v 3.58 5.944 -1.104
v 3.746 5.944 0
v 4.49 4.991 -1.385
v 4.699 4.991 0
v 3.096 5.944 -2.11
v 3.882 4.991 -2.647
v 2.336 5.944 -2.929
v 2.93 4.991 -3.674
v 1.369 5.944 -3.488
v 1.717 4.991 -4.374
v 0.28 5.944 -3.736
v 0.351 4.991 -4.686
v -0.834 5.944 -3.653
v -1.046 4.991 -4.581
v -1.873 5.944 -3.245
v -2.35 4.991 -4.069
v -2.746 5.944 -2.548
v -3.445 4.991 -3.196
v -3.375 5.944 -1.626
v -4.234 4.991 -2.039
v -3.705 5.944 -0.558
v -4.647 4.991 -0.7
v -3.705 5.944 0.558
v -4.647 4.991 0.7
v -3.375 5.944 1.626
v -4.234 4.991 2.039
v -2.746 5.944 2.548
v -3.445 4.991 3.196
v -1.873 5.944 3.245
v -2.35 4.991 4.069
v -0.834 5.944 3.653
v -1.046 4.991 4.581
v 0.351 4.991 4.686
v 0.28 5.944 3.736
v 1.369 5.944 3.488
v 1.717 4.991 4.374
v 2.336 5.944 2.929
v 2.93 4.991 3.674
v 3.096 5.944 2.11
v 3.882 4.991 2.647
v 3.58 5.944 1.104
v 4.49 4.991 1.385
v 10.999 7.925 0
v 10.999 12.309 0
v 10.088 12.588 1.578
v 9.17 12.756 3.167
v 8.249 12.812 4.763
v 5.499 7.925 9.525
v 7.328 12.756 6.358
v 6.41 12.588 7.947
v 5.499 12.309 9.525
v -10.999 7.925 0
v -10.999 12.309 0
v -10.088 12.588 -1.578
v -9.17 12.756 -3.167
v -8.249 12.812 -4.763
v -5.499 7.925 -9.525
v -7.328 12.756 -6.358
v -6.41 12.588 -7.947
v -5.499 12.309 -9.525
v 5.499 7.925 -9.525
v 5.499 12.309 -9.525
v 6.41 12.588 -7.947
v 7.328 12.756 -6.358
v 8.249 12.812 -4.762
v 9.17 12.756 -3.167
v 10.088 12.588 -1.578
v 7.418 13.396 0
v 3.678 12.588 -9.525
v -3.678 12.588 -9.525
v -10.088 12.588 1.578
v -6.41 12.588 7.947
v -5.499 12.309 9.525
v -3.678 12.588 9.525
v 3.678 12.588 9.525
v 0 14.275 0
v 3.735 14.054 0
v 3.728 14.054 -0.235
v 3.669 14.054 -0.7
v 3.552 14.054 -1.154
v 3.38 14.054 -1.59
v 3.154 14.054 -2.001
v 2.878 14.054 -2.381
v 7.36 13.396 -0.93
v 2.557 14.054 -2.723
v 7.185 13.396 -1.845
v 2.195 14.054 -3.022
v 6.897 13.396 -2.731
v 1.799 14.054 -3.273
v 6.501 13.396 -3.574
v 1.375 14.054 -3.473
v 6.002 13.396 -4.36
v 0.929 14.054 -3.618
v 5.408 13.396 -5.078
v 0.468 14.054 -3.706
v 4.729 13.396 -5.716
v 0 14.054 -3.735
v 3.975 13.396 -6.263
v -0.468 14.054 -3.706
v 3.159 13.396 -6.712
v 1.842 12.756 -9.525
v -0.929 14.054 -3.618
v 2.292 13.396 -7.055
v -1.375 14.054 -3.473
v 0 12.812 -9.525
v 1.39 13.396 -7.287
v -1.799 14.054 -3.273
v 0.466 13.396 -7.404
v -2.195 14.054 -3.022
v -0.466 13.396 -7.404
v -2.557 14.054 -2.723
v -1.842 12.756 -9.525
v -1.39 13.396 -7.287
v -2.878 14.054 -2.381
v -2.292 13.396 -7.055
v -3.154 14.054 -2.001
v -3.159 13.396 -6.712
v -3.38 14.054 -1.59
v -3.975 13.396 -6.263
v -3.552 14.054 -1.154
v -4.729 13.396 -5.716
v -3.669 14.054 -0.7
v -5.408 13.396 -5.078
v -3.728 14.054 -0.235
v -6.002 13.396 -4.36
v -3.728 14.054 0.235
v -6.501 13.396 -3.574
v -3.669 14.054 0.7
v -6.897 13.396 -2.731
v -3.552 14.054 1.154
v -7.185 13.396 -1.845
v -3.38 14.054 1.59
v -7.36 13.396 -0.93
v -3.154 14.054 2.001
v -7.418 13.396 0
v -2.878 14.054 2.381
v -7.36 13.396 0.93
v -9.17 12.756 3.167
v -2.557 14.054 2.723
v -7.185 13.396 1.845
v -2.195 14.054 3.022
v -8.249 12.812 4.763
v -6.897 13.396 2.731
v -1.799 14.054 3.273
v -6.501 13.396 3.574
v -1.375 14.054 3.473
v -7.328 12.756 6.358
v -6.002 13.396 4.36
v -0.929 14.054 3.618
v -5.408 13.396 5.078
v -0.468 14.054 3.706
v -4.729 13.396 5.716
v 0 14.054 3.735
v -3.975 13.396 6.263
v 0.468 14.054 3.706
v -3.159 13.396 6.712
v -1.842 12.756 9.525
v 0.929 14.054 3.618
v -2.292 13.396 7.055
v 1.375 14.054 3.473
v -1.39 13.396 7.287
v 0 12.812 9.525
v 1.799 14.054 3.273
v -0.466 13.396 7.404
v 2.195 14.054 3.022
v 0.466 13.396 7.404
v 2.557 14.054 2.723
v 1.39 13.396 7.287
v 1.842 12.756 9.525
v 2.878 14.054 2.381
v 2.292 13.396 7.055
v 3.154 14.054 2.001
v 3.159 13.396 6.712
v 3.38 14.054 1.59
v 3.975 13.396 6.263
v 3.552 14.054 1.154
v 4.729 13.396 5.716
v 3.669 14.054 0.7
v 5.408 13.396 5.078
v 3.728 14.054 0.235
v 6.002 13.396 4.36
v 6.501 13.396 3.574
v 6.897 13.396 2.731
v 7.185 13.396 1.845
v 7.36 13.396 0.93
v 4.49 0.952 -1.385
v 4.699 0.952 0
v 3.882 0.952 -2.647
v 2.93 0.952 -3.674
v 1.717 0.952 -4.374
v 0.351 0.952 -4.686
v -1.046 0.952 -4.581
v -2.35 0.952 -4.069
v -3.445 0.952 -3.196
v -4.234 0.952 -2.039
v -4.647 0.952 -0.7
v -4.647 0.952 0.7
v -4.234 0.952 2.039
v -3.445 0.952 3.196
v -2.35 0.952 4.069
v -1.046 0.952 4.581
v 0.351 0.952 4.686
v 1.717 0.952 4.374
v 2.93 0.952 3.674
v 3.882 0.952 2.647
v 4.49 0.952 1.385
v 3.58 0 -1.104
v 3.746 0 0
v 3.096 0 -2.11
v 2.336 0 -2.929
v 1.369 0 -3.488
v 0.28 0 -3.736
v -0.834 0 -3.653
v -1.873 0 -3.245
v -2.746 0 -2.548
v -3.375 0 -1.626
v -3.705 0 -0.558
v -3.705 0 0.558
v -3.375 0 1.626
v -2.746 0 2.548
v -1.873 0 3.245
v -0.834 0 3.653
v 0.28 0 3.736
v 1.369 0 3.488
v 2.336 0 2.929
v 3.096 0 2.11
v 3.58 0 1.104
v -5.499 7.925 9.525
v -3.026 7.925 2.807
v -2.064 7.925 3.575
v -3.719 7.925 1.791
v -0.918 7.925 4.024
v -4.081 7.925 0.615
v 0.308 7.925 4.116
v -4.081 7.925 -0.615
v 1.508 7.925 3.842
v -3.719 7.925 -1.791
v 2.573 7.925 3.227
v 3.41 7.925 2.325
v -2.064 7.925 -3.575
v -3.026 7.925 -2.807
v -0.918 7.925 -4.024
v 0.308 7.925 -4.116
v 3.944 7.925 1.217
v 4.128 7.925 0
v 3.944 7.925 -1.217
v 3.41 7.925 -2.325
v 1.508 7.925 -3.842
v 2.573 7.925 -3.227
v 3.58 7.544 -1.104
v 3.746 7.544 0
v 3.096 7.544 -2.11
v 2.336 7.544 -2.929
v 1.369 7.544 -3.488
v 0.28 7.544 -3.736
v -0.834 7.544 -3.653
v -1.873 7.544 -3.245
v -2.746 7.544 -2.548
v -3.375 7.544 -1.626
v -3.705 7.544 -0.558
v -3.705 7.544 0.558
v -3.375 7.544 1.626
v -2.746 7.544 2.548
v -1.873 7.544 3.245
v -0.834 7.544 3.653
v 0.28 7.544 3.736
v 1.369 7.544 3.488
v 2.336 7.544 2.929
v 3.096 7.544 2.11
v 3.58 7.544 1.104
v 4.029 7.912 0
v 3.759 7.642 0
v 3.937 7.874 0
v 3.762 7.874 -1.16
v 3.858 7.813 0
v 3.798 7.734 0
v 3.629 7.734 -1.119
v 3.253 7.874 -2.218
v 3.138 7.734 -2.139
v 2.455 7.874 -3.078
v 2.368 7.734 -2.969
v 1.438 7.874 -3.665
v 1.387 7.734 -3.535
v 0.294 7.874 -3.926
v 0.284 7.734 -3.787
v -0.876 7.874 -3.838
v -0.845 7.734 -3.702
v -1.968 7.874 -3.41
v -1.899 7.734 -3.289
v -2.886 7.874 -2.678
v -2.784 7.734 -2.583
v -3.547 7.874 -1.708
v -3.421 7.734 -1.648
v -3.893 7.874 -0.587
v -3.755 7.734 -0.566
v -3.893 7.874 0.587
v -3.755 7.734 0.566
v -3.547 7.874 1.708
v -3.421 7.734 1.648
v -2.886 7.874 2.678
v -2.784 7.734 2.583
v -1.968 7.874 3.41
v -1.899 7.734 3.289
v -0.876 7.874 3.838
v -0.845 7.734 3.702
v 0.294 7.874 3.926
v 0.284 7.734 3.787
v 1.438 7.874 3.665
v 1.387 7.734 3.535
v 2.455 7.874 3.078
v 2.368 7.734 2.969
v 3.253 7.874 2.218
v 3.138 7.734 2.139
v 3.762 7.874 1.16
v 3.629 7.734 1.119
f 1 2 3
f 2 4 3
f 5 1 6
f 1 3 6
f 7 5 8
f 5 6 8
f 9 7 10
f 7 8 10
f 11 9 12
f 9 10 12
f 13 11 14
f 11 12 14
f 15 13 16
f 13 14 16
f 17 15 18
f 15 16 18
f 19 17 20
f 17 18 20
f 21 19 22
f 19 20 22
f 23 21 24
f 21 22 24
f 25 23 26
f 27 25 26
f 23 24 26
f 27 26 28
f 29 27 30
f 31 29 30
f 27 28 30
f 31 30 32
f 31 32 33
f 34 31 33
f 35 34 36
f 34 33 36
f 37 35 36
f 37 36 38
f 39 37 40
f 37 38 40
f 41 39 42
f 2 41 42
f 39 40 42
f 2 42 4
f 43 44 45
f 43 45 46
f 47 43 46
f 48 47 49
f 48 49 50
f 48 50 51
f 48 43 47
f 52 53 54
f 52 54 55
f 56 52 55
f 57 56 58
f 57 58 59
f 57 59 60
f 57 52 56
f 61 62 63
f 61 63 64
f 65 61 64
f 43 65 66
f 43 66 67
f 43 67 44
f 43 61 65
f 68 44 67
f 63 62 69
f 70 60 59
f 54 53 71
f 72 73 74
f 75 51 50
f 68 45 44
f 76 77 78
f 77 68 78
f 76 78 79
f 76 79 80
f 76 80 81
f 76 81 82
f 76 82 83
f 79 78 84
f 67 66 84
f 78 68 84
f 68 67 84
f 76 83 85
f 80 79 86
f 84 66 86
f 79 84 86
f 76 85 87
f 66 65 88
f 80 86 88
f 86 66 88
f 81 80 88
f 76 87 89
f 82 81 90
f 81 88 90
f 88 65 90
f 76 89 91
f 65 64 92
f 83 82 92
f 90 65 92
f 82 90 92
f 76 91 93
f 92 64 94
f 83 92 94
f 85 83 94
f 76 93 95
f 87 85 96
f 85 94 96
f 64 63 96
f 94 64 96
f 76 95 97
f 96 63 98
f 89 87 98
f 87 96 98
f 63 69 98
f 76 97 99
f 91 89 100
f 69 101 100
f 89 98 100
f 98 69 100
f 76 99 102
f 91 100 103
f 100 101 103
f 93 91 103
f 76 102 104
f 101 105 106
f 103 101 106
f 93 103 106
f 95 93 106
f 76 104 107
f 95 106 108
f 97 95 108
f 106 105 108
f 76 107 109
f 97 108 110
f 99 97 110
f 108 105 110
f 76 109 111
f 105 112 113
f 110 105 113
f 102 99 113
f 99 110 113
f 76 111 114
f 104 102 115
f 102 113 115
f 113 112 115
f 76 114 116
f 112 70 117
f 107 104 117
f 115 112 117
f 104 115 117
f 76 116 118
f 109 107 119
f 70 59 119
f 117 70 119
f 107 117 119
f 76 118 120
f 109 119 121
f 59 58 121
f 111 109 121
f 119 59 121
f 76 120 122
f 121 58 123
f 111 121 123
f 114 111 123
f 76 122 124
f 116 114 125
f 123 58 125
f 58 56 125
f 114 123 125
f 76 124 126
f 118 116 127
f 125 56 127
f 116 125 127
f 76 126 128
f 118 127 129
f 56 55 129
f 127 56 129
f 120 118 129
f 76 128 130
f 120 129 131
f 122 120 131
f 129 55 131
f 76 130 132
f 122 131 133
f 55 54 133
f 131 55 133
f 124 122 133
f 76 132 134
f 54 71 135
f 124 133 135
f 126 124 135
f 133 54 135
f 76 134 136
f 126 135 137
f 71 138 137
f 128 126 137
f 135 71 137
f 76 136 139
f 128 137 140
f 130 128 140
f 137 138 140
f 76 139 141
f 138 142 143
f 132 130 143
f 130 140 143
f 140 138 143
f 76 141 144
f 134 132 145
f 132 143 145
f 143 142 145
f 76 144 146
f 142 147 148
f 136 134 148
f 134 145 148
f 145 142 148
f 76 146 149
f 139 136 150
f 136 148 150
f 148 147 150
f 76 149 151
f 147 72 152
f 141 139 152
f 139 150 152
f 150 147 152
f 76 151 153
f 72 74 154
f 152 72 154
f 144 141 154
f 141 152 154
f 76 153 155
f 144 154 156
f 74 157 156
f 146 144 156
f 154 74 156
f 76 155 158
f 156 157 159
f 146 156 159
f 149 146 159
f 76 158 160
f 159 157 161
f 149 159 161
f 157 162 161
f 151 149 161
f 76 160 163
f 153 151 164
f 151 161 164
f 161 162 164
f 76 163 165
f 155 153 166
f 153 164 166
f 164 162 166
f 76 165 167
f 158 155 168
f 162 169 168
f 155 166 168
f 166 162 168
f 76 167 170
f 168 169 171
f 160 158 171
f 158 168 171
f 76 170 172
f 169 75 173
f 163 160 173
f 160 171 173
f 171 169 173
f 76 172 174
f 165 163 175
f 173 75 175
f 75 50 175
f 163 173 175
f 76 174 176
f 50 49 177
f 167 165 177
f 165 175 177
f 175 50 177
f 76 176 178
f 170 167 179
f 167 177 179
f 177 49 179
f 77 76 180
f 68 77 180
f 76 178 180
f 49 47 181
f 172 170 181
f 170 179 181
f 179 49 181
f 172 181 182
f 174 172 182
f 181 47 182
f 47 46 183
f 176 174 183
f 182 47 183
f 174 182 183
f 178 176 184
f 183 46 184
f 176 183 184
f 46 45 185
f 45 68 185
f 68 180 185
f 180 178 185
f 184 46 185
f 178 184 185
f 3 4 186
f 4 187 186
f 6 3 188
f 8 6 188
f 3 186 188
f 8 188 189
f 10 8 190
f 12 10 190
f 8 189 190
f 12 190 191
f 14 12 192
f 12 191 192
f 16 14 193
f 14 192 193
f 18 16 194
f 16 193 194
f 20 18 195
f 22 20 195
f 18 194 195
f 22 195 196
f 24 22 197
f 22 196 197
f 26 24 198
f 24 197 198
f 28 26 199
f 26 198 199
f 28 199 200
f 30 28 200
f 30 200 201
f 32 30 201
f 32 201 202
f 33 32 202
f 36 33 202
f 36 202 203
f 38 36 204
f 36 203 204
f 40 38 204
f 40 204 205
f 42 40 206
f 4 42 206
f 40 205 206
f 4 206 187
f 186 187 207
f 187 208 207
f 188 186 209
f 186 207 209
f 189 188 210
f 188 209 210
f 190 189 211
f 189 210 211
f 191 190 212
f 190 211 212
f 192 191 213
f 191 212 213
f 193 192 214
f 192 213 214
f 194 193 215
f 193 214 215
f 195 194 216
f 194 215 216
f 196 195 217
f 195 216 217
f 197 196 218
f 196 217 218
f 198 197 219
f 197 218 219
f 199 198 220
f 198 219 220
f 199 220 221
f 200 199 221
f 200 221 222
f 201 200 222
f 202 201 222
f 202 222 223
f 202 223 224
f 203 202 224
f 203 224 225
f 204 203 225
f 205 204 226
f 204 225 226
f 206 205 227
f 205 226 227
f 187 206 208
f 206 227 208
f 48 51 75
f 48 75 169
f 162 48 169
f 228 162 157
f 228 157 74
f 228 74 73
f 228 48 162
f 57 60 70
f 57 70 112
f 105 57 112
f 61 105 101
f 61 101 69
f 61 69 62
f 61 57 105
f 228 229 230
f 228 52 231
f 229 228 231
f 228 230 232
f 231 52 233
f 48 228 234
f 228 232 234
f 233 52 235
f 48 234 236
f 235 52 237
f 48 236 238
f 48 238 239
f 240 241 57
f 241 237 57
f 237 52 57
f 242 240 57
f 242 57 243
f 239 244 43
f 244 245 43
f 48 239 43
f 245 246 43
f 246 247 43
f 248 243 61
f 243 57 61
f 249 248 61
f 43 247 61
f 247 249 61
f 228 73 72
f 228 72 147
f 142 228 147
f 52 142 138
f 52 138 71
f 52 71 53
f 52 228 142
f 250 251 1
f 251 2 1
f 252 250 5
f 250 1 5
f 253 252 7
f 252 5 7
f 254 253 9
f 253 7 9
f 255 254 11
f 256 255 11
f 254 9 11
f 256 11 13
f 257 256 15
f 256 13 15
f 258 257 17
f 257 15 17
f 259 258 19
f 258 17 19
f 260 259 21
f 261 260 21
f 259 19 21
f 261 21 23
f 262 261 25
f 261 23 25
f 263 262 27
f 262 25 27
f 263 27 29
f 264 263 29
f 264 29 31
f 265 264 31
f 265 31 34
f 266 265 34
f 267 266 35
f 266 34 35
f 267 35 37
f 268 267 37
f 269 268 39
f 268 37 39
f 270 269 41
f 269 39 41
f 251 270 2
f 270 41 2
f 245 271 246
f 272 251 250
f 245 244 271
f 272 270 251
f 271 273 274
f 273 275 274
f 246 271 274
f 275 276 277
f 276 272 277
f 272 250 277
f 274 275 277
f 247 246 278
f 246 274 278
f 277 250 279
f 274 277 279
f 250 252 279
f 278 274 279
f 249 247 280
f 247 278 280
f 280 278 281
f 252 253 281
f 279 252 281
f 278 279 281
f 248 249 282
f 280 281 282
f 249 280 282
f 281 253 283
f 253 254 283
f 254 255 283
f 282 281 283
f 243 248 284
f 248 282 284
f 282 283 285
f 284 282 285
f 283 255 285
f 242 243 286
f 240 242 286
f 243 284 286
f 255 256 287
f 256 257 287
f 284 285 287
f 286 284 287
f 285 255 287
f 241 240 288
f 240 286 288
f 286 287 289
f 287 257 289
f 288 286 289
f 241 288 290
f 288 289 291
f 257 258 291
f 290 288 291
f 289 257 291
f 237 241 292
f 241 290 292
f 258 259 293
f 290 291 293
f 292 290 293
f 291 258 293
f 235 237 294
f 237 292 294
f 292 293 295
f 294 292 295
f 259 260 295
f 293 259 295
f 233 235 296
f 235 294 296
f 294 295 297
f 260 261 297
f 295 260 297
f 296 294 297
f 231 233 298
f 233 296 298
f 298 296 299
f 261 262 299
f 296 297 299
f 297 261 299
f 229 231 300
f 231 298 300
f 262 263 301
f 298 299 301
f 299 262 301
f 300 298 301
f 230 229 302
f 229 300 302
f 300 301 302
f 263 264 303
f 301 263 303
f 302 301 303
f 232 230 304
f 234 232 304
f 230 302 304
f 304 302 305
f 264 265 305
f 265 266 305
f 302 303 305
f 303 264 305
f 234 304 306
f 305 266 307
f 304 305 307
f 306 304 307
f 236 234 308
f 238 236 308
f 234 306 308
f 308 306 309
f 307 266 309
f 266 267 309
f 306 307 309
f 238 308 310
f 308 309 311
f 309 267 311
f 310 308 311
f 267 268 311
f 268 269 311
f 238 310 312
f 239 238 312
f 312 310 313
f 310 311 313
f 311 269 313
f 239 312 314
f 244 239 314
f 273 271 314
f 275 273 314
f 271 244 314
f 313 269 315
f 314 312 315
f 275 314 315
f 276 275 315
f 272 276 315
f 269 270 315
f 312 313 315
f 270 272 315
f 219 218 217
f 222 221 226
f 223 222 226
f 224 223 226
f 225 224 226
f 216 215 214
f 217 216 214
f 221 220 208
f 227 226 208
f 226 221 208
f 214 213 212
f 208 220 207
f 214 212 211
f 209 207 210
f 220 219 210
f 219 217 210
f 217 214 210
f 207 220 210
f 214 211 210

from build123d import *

# Parameters (mm, degrees)
CUT_EXTRUDE2_DEPTH = 14.2748


with BuildPart() as part:
    # Sketch3 → Revolve1 (revolve)
    with BuildSketch(Plane.XY):
        with BuildLine():
            Line((4.699, 4.9911), (4.699, 0.9525))
            Line((4.699, 0.9525), (3.7465, 0))
            Line((3.7465, 0), (0, 0))
            Line((0, 0), (0, 14.2748))
            ThreePointArc((0, 14.2748), (5.586411751, 13.779471711), (10.9985175, 12.308941969))
            Line((10.9985175, 12.308941969), (10.9985175, 7.9248))
            Line((10.9985175, 7.9248), (4.1275, 7.9248))
            ThreePointArc((4.1275, 7.9248), (3.858092316, 7.813207684), (3.7465, 7.5438))
            Line((3.7465, 7.5438), (3.7465, 5.9436))
            Line((3.7465, 5.9436), (4.699, 4.9911))
        make_face()
    revolve(axis=Axis((0, -1000, 0), (0, 1, 0)))

    # Sketch1 → Cut-Extrude2 (cut)
    with BuildSketch(Plane(origin=(0, 0, 0), x_dir=(1, 0, 0), z_dir=(0, 1, 0))):
        with BuildLine():
            ThreePointArc((-5.499261314, -9.525), (0, -10.998522628), (5.499261314, -9.525))
            Line((5.499261314, -9.525), (-5.499261314, -9.525))
        make_face()
        with BuildLine():
            ThreePointArc((-10.998522628, 0), (-9.525, -5.499261314), (-5.499261314, -9.525))
            Line((-5.499261314, -9.525), (-10.998522628, 0))
        make_face()
        with BuildLine():
            ThreePointArc((5.499261314, -9.525), (9.525, -5.499261314), (10.998522628, 0))
            Line((10.998522628, 0), (5.499261314, -9.525))
        make_face()
        with BuildLine():
            Line((5.499261314, 9.525), (10.998522628, 0))
            ThreePointArc((10.998522628, 0), (9.525, 5.499261314), (5.499261314, 9.525))
        make_face()
        with BuildLine():
            Line((-5.499261314, 9.525), (5.499261314, 9.525))
            ThreePointArc((5.499261314, 9.525), (0, 10.998522628), (-5.499261314, 9.525))
        make_face()
        with BuildLine():
            Line((-10.998522628, 0), (-5.499261314, 9.525))
            ThreePointArc((-5.499261314, 9.525), (-9.525, 5.499261314), (-10.998522628, 0))
        make_face()
    extrude(amount=CUT_EXTRUDE2_DEPTH, mode=Mode.SUBTRACT)


solid = part.part
